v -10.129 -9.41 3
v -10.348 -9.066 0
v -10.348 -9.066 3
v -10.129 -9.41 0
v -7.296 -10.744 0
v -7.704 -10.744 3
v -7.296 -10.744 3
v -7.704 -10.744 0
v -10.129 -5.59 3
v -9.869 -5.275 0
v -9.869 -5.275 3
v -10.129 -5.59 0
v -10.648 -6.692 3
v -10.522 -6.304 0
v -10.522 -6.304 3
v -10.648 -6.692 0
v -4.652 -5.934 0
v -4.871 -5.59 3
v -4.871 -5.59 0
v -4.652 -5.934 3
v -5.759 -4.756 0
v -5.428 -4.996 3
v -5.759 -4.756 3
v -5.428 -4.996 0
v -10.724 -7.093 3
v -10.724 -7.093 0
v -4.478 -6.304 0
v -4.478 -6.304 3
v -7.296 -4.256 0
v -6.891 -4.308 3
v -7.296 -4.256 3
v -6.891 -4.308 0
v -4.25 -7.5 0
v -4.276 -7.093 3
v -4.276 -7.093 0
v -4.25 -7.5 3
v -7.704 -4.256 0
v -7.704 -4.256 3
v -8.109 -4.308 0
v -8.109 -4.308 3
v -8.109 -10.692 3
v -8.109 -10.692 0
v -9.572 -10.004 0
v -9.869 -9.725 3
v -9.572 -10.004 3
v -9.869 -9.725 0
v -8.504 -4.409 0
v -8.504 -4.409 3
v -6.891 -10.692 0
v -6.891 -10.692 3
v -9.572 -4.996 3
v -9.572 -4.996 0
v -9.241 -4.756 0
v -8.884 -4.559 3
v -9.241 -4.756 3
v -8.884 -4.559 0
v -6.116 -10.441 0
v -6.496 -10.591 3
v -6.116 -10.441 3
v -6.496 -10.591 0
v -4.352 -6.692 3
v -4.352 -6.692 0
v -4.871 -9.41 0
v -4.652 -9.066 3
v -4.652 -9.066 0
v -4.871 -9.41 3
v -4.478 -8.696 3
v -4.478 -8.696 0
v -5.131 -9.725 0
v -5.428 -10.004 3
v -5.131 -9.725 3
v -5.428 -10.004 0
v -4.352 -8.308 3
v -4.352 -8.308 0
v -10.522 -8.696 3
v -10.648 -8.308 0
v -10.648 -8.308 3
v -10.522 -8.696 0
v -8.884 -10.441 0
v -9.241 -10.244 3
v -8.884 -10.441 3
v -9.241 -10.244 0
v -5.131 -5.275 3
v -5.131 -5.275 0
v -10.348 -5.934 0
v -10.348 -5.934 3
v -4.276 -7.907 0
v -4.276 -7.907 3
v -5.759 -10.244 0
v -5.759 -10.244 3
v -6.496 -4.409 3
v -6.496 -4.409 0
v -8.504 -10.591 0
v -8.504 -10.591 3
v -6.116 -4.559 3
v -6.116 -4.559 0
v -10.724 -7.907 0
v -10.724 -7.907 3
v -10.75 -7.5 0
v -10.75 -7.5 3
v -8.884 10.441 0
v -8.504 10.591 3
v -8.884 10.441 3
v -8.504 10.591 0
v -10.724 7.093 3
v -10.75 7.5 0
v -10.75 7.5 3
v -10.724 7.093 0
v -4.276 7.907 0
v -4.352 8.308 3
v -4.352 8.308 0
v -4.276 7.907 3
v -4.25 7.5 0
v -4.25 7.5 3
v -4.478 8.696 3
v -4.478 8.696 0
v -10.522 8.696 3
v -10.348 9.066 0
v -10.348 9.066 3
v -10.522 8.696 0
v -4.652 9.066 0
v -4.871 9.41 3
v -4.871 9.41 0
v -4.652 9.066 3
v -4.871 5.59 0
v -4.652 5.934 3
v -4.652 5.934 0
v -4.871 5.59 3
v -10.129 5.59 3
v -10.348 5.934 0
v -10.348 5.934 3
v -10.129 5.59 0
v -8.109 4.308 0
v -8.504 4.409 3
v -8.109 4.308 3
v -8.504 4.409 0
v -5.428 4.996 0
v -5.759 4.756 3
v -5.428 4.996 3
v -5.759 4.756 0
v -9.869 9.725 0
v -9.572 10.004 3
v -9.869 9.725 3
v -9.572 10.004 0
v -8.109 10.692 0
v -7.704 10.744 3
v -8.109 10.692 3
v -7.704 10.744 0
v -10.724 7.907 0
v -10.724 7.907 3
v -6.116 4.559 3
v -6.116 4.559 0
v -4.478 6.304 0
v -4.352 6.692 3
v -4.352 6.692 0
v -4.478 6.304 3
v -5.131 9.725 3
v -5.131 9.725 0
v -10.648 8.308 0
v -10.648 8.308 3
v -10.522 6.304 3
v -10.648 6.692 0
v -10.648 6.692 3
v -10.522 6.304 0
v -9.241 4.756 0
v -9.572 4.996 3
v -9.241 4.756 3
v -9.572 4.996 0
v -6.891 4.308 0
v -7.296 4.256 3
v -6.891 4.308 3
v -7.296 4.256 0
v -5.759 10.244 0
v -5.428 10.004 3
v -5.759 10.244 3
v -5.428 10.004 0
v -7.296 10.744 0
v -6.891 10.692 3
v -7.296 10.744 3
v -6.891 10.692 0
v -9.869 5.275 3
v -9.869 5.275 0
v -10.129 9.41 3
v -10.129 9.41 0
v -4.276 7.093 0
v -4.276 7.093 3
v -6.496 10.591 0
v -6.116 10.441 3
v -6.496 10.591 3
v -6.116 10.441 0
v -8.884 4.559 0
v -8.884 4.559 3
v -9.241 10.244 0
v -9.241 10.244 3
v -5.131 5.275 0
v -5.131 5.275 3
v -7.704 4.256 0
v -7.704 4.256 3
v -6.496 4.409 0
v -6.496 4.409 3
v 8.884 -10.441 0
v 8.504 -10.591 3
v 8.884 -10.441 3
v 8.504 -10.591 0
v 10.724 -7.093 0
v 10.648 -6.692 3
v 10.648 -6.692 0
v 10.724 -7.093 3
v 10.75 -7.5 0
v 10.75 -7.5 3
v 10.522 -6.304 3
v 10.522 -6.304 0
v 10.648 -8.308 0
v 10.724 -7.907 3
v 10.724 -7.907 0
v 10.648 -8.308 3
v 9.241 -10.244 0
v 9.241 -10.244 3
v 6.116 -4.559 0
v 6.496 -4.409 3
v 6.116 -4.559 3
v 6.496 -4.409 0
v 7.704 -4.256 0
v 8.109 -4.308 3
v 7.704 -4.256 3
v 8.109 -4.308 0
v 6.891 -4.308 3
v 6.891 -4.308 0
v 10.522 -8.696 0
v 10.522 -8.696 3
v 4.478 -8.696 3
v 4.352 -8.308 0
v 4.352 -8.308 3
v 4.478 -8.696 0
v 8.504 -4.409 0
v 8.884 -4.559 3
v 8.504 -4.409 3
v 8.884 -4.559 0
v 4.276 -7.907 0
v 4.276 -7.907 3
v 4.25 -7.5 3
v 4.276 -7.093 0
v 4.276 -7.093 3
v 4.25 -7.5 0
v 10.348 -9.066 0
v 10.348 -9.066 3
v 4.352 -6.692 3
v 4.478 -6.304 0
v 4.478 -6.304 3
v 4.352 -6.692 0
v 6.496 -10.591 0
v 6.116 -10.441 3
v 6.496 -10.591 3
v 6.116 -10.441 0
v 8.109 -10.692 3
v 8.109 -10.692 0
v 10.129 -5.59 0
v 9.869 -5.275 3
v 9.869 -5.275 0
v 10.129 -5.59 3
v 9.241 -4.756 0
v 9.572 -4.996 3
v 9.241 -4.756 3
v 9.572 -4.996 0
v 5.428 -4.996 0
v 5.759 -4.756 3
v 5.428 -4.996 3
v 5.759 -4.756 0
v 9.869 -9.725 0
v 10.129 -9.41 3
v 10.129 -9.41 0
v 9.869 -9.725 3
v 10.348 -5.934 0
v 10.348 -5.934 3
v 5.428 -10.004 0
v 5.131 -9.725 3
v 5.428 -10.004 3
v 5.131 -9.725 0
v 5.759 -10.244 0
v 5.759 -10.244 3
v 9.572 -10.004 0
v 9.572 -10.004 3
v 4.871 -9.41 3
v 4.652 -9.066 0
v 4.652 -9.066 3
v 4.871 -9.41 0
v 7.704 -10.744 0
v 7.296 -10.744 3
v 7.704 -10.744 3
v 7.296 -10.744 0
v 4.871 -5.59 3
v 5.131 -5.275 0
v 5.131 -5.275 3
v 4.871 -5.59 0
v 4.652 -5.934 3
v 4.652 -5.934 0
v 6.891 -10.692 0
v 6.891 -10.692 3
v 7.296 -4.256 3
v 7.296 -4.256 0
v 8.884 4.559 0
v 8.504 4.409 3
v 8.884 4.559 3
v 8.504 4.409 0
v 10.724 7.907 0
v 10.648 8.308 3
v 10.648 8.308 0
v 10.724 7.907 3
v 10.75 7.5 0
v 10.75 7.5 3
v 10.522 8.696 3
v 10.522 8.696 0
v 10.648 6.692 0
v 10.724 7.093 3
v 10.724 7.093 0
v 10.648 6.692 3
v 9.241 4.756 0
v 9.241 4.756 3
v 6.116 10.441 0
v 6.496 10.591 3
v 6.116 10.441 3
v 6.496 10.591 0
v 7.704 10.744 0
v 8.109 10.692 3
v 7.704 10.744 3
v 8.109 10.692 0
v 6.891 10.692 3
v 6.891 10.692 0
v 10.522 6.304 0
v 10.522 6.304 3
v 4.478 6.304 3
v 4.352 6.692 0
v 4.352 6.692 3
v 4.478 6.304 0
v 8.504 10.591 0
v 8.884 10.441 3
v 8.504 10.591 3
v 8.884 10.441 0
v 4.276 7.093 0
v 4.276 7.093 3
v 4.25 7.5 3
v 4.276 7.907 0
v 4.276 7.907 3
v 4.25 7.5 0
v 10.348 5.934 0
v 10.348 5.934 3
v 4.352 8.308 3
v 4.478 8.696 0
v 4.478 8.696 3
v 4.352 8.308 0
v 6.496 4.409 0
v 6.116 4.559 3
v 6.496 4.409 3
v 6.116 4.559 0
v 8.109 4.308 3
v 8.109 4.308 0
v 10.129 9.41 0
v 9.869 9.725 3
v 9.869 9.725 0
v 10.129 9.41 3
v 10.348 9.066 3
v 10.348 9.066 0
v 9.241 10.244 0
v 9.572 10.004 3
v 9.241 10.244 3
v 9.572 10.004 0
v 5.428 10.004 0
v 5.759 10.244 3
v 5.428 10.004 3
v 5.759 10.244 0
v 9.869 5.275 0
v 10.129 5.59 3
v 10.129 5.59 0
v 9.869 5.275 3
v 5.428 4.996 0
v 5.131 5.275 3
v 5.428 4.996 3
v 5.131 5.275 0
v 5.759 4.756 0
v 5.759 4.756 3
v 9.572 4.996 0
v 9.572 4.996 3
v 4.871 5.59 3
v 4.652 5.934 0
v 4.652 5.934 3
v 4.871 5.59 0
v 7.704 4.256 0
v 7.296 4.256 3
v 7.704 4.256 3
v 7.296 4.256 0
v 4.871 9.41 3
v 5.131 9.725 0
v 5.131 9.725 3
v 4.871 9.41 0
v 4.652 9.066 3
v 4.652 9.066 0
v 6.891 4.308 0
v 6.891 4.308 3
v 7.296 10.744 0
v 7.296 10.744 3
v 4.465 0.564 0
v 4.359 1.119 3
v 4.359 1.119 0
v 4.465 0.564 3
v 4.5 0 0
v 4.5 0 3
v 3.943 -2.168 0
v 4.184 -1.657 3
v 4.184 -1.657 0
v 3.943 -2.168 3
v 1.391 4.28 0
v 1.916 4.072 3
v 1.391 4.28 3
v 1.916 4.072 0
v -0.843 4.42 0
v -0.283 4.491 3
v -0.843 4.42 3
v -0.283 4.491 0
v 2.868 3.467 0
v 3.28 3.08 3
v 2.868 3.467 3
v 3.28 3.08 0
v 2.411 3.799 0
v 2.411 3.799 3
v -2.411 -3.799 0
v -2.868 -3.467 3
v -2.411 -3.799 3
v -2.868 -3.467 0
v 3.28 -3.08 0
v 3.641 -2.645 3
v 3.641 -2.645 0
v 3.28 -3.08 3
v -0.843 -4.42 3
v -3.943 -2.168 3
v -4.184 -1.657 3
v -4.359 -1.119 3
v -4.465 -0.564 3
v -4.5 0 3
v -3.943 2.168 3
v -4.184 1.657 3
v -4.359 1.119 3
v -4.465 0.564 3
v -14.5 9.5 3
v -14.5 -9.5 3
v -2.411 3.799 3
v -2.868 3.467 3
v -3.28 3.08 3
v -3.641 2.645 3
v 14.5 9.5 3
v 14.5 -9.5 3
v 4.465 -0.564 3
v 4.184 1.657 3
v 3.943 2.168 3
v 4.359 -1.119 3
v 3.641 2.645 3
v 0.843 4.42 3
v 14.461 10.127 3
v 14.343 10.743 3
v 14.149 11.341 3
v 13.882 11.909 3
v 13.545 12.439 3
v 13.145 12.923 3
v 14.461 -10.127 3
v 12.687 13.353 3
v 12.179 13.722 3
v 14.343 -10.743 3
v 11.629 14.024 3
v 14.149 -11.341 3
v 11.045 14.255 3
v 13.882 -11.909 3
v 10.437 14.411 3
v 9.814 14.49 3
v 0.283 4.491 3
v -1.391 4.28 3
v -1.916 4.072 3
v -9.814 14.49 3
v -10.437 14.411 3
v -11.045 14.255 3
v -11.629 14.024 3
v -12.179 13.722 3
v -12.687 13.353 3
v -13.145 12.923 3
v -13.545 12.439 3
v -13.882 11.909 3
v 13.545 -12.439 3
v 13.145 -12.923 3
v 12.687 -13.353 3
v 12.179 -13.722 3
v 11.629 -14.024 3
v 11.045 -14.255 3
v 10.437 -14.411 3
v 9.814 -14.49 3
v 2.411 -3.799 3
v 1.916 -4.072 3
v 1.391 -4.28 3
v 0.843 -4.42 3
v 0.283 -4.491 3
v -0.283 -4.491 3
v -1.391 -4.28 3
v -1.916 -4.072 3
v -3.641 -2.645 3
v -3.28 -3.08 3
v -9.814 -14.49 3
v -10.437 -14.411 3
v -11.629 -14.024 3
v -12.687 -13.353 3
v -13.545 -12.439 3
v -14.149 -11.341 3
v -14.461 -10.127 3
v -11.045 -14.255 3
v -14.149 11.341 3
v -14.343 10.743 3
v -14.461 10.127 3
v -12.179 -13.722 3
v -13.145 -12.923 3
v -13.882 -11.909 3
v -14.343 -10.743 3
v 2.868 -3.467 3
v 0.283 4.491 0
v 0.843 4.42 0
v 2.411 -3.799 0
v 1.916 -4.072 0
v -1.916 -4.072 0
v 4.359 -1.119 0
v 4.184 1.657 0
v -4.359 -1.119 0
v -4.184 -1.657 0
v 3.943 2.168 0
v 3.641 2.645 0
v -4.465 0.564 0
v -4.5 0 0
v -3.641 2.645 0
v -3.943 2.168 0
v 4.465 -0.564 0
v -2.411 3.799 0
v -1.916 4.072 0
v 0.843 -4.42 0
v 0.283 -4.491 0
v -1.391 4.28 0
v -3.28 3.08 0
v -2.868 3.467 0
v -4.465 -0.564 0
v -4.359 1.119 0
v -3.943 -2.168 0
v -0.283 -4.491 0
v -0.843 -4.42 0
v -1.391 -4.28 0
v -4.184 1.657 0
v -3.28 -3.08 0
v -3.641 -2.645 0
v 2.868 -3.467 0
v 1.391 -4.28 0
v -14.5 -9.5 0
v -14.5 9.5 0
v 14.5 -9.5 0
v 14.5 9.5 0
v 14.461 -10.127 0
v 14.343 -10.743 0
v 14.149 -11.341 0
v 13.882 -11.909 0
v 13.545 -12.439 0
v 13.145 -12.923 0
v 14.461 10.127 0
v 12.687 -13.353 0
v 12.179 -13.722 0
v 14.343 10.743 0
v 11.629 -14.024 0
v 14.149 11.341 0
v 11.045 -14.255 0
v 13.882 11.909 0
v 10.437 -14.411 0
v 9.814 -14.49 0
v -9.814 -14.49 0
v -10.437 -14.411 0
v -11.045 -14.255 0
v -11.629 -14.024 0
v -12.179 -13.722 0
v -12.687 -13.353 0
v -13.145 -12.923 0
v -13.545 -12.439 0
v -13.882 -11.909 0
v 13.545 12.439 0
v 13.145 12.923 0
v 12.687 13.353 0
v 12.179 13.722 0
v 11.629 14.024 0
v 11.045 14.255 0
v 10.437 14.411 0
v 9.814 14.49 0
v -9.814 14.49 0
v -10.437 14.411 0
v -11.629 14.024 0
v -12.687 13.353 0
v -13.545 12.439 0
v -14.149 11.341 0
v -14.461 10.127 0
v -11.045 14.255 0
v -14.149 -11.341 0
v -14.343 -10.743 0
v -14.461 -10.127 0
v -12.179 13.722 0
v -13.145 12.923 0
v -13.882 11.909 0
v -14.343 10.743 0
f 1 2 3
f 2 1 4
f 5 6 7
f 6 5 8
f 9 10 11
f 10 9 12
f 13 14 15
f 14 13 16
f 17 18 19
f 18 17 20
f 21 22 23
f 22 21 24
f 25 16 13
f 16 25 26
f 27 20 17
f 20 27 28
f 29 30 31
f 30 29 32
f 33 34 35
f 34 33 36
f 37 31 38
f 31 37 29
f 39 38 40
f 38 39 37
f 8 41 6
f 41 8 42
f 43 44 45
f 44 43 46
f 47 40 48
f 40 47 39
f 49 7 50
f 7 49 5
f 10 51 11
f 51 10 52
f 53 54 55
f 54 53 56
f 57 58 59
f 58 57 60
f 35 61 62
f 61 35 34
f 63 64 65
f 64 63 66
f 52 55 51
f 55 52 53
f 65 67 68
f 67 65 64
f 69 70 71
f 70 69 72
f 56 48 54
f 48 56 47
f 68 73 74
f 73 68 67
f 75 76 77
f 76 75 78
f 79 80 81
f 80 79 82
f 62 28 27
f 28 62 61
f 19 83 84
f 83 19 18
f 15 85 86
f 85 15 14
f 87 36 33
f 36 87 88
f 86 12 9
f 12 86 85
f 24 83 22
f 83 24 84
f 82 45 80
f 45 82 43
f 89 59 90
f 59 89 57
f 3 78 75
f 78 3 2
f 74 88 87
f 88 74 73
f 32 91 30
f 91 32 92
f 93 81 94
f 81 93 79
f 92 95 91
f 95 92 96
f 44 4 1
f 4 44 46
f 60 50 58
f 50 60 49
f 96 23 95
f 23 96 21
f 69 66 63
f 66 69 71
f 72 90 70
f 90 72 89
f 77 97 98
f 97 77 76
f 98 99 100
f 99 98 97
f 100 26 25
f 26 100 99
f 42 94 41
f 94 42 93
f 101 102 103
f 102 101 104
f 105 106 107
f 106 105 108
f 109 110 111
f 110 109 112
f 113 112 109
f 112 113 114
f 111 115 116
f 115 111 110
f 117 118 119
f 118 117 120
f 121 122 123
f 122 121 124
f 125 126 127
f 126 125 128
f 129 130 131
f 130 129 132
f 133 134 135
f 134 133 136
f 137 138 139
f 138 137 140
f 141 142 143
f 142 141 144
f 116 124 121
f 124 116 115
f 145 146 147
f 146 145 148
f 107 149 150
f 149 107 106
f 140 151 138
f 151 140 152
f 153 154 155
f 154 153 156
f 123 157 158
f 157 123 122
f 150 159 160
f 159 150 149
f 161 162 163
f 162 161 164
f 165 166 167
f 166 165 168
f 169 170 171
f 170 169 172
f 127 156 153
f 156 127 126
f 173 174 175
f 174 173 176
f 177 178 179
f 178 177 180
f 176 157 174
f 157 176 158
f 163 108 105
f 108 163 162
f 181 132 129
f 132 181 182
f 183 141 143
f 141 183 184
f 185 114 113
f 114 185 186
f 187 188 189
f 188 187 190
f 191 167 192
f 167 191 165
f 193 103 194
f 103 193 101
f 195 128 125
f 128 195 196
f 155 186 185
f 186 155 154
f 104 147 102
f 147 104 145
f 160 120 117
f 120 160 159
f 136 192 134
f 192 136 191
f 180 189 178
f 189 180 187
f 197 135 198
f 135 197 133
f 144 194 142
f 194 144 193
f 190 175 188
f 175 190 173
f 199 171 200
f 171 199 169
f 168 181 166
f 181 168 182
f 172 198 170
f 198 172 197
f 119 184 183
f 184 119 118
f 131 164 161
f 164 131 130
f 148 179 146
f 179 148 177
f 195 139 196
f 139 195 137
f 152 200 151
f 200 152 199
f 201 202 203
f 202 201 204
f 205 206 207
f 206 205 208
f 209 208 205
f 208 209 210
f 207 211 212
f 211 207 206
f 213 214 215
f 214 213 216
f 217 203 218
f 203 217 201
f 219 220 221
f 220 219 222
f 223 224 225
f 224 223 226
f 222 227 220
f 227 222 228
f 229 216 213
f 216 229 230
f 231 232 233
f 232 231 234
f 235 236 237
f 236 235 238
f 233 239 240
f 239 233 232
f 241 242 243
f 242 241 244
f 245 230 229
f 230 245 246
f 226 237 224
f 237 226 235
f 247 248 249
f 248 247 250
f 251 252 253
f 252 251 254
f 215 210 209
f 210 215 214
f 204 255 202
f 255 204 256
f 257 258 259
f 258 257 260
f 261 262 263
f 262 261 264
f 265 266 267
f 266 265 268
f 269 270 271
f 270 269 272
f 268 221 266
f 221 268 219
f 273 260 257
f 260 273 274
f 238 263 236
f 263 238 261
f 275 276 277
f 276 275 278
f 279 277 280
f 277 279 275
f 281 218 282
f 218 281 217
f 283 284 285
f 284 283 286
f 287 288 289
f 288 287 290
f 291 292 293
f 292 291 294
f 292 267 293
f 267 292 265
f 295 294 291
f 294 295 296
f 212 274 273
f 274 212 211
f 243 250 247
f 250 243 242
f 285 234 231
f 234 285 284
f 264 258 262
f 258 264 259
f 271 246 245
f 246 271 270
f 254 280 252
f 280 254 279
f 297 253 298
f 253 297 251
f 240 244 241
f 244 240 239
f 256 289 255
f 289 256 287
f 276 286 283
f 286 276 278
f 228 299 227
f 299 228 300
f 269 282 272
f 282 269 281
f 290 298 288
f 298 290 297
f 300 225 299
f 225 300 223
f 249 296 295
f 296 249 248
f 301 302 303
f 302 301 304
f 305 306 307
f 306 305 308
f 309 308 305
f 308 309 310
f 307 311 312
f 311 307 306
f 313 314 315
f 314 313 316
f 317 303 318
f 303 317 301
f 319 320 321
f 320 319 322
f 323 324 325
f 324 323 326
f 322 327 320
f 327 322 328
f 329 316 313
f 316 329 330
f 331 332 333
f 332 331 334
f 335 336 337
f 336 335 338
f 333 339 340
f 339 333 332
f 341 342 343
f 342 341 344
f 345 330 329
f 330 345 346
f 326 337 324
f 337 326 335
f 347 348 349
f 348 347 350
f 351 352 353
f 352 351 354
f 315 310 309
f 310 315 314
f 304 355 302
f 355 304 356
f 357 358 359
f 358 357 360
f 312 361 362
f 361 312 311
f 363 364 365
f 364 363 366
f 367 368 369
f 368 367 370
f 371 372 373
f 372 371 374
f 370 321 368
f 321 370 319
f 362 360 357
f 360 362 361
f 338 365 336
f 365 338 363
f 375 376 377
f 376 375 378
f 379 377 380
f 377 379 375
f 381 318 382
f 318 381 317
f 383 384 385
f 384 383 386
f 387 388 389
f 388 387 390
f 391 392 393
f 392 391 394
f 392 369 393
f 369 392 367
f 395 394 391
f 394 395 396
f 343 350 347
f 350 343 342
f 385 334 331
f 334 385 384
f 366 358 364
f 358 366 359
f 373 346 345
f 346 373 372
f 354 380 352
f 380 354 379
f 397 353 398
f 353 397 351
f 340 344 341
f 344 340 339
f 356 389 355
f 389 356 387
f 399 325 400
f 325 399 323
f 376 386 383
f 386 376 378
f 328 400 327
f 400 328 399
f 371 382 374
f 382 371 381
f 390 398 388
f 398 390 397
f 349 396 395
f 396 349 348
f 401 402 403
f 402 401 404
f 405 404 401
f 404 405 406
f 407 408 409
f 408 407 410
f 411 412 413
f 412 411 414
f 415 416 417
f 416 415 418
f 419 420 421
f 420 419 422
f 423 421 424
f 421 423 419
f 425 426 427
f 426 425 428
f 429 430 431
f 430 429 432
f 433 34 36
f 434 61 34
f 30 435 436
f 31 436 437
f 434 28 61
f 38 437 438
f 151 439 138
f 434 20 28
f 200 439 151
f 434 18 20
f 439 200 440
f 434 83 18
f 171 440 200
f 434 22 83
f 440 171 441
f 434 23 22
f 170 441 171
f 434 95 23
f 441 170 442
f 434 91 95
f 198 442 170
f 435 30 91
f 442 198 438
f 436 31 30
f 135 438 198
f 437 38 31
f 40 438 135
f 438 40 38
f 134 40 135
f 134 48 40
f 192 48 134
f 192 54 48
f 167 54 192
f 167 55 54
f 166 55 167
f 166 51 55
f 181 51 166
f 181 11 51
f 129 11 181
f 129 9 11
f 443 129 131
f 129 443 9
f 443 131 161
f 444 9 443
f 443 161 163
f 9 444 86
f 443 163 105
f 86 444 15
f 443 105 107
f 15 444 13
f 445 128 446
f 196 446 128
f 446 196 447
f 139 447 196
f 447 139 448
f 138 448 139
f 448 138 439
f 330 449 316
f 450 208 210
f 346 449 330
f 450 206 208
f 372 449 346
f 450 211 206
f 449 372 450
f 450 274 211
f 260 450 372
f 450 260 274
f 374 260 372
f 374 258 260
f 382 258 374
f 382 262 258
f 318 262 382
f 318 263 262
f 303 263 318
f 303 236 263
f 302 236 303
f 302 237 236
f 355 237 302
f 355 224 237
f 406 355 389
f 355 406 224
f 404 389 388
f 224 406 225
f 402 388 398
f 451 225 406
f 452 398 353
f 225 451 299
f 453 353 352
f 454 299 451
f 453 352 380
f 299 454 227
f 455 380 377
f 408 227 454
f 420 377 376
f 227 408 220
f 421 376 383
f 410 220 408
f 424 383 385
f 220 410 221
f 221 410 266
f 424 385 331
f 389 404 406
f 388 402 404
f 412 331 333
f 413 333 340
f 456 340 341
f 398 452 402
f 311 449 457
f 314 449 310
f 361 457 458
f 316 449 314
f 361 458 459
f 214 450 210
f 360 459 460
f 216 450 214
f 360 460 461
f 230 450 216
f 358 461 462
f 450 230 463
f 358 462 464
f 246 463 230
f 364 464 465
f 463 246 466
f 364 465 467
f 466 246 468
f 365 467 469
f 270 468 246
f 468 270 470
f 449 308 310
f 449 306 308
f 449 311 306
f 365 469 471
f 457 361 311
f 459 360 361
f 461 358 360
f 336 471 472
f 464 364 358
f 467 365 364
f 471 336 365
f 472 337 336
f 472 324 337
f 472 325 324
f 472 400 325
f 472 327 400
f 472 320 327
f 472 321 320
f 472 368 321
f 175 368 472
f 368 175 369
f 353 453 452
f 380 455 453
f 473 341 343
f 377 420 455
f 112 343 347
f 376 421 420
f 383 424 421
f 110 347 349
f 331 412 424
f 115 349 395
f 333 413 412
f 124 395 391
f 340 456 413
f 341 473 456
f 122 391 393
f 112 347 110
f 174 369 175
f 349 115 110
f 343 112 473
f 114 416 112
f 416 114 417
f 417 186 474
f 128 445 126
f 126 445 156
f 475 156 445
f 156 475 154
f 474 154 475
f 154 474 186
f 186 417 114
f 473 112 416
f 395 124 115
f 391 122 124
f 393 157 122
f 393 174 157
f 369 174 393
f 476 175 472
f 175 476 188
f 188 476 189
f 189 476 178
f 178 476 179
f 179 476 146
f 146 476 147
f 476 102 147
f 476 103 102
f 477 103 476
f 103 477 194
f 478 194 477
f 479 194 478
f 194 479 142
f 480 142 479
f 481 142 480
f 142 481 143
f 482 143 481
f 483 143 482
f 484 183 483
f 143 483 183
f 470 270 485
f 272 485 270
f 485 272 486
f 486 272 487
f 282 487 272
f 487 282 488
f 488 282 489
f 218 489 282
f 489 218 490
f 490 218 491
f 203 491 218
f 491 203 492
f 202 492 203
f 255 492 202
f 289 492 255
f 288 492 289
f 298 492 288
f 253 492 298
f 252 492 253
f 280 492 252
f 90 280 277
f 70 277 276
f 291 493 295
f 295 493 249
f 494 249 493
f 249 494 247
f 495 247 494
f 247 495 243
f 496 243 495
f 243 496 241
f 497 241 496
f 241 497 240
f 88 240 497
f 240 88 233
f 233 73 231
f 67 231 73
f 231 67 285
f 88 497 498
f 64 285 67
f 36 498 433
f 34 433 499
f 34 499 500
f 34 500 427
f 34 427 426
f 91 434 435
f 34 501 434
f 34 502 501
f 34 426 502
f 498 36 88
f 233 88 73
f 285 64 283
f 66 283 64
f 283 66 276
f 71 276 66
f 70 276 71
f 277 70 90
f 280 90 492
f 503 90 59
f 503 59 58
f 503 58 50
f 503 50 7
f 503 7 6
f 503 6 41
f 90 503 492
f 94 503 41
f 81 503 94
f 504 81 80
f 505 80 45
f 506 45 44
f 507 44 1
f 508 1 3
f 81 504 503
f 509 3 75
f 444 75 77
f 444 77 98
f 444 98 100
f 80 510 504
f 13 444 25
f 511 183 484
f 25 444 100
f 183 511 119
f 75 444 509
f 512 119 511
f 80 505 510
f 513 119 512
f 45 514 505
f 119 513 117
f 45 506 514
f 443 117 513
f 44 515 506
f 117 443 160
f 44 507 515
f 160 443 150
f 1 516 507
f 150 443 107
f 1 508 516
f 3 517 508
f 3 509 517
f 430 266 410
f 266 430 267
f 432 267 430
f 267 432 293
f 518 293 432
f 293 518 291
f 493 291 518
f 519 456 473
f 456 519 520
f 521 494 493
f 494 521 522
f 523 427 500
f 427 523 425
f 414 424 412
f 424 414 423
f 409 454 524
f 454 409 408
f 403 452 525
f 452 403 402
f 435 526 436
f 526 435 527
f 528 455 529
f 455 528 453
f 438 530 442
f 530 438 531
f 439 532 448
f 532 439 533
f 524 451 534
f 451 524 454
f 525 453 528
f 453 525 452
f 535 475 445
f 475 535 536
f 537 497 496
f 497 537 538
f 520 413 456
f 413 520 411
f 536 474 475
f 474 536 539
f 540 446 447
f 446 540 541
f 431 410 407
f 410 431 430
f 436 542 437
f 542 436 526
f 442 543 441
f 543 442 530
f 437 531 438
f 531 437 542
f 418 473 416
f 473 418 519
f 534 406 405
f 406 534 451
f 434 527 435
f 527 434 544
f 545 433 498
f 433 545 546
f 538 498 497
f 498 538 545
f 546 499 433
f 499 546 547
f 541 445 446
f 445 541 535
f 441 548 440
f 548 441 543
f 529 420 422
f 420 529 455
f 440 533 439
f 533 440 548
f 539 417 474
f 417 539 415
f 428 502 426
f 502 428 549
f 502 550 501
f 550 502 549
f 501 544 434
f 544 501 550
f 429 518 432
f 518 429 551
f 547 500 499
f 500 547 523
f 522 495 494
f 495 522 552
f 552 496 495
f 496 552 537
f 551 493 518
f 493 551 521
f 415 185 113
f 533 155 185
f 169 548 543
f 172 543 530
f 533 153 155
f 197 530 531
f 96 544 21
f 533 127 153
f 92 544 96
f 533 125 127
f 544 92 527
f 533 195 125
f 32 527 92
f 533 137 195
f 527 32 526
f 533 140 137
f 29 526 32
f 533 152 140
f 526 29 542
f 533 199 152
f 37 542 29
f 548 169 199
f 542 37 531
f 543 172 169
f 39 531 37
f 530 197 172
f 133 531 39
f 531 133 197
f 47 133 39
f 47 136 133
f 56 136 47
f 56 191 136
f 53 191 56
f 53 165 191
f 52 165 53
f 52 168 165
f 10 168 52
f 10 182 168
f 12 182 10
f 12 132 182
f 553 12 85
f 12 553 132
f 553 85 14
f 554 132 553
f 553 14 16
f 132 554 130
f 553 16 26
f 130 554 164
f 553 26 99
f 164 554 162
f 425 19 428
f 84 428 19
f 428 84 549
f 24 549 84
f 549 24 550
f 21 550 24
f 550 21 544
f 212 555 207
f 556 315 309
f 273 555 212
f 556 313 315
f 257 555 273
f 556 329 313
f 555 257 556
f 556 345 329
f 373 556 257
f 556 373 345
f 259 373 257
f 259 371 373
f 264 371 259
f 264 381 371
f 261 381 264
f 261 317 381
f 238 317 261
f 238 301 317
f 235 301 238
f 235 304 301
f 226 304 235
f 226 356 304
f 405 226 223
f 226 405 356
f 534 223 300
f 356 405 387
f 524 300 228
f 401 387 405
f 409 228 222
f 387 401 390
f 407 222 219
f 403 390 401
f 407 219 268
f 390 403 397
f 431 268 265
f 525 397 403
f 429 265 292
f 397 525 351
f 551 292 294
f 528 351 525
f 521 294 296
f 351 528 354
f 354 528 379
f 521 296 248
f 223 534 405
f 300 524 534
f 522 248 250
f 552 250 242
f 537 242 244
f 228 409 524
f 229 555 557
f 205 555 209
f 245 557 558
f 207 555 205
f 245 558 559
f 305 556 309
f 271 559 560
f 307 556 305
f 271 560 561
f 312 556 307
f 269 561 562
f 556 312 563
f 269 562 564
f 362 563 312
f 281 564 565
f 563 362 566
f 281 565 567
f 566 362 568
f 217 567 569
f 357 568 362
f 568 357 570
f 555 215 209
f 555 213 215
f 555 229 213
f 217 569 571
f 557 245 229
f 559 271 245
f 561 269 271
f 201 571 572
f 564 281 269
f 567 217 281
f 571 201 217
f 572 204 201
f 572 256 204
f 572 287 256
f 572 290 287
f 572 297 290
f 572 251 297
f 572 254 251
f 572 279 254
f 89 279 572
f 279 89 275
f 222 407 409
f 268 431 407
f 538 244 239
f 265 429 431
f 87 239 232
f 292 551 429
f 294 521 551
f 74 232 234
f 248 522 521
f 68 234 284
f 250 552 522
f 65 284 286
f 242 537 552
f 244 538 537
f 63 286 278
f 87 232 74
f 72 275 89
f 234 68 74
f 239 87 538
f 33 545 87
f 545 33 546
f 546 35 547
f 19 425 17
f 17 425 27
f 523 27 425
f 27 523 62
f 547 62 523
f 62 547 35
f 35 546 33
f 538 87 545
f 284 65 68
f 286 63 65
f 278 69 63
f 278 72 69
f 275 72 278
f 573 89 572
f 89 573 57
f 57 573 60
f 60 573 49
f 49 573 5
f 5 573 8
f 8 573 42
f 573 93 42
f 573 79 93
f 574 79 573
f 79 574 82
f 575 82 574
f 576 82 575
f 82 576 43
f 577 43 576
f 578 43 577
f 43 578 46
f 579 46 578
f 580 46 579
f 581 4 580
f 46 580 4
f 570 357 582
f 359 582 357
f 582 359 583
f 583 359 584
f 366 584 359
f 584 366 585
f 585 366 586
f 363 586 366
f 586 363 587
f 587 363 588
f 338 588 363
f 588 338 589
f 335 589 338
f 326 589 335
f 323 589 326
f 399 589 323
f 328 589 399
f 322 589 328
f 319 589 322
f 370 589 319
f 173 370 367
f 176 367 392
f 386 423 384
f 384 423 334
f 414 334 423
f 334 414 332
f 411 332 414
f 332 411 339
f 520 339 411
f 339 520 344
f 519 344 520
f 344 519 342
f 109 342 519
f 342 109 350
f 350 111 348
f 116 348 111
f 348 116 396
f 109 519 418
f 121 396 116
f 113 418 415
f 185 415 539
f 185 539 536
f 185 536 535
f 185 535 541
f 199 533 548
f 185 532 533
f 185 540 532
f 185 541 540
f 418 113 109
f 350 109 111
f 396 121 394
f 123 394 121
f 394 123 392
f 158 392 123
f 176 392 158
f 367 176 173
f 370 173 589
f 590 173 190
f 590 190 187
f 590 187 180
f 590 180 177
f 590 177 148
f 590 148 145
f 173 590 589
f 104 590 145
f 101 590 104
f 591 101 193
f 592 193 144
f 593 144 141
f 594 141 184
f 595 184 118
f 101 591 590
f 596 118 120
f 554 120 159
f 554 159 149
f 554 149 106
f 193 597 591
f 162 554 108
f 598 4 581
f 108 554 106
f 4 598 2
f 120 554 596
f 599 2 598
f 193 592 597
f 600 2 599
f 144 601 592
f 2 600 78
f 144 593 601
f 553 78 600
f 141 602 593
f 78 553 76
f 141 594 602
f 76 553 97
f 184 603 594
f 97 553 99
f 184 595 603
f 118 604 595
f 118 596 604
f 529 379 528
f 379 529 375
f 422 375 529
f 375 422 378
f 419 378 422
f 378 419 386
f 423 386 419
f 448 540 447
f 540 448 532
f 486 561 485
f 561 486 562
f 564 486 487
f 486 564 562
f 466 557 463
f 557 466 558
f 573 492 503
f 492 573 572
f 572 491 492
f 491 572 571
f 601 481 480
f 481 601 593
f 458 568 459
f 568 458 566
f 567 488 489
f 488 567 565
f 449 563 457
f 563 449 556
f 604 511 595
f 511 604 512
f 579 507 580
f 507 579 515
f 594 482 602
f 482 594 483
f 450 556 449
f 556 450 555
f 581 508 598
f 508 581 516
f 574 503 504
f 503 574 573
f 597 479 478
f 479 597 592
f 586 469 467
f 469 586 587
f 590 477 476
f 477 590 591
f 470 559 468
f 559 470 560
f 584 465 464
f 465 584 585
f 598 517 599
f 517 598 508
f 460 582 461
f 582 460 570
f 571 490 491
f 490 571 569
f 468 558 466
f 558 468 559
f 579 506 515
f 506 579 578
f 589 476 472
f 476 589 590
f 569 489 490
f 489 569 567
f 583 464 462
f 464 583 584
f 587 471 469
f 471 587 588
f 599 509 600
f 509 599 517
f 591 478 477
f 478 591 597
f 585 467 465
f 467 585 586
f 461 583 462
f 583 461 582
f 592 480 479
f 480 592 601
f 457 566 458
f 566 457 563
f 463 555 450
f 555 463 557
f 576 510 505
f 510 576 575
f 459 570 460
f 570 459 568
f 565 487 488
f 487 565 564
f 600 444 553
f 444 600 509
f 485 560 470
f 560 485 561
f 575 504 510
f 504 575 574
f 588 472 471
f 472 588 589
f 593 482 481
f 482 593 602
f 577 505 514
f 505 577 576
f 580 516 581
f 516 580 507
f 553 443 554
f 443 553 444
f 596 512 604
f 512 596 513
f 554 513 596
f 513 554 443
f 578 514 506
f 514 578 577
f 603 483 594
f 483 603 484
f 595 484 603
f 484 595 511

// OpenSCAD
$fn = 50;


difference() {
	union() {
		hull() {
			translate(v = [-9.5000000000, 9.5000000000, 0]) {
				cylinder(h = 3, r = 5);
			}
			translate(v = [9.5000000000, 9.5000000000, 0]) {
				cylinder(h = 3, r = 5);
			}
			translate(v = [-9.5000000000, -9.5000000000, 0]) {
				cylinder(h = 3, r = 5);
			}
			translate(v = [9.5000000000, -9.5000000000, 0]) {
				cylinder(h = 3, r = 5);
			}
		}
	}
	union() {
		#translate(v = [-7.5000000000, -7.5000000000, -100.0000000000]) {
			cylinder(h = 200, r = 3.2500000000);
		}
		#translate(v = [-7.5000000000, 7.5000000000, -100.0000000000]) {
			cylinder(h = 200, r = 3.2500000000);
		}
		#translate(v = [7.5000000000, -7.5000000000, -100.0000000000]) {
			cylinder(h = 200, r = 3.2500000000);
		}
		#translate(v = [7.5000000000, 7.5000000000, -100.0000000000]) {
			cylinder(h = 200, r = 3.2500000000);
		}
		#cylinder(h = 3, r = 4.5000000000);
	}
}
